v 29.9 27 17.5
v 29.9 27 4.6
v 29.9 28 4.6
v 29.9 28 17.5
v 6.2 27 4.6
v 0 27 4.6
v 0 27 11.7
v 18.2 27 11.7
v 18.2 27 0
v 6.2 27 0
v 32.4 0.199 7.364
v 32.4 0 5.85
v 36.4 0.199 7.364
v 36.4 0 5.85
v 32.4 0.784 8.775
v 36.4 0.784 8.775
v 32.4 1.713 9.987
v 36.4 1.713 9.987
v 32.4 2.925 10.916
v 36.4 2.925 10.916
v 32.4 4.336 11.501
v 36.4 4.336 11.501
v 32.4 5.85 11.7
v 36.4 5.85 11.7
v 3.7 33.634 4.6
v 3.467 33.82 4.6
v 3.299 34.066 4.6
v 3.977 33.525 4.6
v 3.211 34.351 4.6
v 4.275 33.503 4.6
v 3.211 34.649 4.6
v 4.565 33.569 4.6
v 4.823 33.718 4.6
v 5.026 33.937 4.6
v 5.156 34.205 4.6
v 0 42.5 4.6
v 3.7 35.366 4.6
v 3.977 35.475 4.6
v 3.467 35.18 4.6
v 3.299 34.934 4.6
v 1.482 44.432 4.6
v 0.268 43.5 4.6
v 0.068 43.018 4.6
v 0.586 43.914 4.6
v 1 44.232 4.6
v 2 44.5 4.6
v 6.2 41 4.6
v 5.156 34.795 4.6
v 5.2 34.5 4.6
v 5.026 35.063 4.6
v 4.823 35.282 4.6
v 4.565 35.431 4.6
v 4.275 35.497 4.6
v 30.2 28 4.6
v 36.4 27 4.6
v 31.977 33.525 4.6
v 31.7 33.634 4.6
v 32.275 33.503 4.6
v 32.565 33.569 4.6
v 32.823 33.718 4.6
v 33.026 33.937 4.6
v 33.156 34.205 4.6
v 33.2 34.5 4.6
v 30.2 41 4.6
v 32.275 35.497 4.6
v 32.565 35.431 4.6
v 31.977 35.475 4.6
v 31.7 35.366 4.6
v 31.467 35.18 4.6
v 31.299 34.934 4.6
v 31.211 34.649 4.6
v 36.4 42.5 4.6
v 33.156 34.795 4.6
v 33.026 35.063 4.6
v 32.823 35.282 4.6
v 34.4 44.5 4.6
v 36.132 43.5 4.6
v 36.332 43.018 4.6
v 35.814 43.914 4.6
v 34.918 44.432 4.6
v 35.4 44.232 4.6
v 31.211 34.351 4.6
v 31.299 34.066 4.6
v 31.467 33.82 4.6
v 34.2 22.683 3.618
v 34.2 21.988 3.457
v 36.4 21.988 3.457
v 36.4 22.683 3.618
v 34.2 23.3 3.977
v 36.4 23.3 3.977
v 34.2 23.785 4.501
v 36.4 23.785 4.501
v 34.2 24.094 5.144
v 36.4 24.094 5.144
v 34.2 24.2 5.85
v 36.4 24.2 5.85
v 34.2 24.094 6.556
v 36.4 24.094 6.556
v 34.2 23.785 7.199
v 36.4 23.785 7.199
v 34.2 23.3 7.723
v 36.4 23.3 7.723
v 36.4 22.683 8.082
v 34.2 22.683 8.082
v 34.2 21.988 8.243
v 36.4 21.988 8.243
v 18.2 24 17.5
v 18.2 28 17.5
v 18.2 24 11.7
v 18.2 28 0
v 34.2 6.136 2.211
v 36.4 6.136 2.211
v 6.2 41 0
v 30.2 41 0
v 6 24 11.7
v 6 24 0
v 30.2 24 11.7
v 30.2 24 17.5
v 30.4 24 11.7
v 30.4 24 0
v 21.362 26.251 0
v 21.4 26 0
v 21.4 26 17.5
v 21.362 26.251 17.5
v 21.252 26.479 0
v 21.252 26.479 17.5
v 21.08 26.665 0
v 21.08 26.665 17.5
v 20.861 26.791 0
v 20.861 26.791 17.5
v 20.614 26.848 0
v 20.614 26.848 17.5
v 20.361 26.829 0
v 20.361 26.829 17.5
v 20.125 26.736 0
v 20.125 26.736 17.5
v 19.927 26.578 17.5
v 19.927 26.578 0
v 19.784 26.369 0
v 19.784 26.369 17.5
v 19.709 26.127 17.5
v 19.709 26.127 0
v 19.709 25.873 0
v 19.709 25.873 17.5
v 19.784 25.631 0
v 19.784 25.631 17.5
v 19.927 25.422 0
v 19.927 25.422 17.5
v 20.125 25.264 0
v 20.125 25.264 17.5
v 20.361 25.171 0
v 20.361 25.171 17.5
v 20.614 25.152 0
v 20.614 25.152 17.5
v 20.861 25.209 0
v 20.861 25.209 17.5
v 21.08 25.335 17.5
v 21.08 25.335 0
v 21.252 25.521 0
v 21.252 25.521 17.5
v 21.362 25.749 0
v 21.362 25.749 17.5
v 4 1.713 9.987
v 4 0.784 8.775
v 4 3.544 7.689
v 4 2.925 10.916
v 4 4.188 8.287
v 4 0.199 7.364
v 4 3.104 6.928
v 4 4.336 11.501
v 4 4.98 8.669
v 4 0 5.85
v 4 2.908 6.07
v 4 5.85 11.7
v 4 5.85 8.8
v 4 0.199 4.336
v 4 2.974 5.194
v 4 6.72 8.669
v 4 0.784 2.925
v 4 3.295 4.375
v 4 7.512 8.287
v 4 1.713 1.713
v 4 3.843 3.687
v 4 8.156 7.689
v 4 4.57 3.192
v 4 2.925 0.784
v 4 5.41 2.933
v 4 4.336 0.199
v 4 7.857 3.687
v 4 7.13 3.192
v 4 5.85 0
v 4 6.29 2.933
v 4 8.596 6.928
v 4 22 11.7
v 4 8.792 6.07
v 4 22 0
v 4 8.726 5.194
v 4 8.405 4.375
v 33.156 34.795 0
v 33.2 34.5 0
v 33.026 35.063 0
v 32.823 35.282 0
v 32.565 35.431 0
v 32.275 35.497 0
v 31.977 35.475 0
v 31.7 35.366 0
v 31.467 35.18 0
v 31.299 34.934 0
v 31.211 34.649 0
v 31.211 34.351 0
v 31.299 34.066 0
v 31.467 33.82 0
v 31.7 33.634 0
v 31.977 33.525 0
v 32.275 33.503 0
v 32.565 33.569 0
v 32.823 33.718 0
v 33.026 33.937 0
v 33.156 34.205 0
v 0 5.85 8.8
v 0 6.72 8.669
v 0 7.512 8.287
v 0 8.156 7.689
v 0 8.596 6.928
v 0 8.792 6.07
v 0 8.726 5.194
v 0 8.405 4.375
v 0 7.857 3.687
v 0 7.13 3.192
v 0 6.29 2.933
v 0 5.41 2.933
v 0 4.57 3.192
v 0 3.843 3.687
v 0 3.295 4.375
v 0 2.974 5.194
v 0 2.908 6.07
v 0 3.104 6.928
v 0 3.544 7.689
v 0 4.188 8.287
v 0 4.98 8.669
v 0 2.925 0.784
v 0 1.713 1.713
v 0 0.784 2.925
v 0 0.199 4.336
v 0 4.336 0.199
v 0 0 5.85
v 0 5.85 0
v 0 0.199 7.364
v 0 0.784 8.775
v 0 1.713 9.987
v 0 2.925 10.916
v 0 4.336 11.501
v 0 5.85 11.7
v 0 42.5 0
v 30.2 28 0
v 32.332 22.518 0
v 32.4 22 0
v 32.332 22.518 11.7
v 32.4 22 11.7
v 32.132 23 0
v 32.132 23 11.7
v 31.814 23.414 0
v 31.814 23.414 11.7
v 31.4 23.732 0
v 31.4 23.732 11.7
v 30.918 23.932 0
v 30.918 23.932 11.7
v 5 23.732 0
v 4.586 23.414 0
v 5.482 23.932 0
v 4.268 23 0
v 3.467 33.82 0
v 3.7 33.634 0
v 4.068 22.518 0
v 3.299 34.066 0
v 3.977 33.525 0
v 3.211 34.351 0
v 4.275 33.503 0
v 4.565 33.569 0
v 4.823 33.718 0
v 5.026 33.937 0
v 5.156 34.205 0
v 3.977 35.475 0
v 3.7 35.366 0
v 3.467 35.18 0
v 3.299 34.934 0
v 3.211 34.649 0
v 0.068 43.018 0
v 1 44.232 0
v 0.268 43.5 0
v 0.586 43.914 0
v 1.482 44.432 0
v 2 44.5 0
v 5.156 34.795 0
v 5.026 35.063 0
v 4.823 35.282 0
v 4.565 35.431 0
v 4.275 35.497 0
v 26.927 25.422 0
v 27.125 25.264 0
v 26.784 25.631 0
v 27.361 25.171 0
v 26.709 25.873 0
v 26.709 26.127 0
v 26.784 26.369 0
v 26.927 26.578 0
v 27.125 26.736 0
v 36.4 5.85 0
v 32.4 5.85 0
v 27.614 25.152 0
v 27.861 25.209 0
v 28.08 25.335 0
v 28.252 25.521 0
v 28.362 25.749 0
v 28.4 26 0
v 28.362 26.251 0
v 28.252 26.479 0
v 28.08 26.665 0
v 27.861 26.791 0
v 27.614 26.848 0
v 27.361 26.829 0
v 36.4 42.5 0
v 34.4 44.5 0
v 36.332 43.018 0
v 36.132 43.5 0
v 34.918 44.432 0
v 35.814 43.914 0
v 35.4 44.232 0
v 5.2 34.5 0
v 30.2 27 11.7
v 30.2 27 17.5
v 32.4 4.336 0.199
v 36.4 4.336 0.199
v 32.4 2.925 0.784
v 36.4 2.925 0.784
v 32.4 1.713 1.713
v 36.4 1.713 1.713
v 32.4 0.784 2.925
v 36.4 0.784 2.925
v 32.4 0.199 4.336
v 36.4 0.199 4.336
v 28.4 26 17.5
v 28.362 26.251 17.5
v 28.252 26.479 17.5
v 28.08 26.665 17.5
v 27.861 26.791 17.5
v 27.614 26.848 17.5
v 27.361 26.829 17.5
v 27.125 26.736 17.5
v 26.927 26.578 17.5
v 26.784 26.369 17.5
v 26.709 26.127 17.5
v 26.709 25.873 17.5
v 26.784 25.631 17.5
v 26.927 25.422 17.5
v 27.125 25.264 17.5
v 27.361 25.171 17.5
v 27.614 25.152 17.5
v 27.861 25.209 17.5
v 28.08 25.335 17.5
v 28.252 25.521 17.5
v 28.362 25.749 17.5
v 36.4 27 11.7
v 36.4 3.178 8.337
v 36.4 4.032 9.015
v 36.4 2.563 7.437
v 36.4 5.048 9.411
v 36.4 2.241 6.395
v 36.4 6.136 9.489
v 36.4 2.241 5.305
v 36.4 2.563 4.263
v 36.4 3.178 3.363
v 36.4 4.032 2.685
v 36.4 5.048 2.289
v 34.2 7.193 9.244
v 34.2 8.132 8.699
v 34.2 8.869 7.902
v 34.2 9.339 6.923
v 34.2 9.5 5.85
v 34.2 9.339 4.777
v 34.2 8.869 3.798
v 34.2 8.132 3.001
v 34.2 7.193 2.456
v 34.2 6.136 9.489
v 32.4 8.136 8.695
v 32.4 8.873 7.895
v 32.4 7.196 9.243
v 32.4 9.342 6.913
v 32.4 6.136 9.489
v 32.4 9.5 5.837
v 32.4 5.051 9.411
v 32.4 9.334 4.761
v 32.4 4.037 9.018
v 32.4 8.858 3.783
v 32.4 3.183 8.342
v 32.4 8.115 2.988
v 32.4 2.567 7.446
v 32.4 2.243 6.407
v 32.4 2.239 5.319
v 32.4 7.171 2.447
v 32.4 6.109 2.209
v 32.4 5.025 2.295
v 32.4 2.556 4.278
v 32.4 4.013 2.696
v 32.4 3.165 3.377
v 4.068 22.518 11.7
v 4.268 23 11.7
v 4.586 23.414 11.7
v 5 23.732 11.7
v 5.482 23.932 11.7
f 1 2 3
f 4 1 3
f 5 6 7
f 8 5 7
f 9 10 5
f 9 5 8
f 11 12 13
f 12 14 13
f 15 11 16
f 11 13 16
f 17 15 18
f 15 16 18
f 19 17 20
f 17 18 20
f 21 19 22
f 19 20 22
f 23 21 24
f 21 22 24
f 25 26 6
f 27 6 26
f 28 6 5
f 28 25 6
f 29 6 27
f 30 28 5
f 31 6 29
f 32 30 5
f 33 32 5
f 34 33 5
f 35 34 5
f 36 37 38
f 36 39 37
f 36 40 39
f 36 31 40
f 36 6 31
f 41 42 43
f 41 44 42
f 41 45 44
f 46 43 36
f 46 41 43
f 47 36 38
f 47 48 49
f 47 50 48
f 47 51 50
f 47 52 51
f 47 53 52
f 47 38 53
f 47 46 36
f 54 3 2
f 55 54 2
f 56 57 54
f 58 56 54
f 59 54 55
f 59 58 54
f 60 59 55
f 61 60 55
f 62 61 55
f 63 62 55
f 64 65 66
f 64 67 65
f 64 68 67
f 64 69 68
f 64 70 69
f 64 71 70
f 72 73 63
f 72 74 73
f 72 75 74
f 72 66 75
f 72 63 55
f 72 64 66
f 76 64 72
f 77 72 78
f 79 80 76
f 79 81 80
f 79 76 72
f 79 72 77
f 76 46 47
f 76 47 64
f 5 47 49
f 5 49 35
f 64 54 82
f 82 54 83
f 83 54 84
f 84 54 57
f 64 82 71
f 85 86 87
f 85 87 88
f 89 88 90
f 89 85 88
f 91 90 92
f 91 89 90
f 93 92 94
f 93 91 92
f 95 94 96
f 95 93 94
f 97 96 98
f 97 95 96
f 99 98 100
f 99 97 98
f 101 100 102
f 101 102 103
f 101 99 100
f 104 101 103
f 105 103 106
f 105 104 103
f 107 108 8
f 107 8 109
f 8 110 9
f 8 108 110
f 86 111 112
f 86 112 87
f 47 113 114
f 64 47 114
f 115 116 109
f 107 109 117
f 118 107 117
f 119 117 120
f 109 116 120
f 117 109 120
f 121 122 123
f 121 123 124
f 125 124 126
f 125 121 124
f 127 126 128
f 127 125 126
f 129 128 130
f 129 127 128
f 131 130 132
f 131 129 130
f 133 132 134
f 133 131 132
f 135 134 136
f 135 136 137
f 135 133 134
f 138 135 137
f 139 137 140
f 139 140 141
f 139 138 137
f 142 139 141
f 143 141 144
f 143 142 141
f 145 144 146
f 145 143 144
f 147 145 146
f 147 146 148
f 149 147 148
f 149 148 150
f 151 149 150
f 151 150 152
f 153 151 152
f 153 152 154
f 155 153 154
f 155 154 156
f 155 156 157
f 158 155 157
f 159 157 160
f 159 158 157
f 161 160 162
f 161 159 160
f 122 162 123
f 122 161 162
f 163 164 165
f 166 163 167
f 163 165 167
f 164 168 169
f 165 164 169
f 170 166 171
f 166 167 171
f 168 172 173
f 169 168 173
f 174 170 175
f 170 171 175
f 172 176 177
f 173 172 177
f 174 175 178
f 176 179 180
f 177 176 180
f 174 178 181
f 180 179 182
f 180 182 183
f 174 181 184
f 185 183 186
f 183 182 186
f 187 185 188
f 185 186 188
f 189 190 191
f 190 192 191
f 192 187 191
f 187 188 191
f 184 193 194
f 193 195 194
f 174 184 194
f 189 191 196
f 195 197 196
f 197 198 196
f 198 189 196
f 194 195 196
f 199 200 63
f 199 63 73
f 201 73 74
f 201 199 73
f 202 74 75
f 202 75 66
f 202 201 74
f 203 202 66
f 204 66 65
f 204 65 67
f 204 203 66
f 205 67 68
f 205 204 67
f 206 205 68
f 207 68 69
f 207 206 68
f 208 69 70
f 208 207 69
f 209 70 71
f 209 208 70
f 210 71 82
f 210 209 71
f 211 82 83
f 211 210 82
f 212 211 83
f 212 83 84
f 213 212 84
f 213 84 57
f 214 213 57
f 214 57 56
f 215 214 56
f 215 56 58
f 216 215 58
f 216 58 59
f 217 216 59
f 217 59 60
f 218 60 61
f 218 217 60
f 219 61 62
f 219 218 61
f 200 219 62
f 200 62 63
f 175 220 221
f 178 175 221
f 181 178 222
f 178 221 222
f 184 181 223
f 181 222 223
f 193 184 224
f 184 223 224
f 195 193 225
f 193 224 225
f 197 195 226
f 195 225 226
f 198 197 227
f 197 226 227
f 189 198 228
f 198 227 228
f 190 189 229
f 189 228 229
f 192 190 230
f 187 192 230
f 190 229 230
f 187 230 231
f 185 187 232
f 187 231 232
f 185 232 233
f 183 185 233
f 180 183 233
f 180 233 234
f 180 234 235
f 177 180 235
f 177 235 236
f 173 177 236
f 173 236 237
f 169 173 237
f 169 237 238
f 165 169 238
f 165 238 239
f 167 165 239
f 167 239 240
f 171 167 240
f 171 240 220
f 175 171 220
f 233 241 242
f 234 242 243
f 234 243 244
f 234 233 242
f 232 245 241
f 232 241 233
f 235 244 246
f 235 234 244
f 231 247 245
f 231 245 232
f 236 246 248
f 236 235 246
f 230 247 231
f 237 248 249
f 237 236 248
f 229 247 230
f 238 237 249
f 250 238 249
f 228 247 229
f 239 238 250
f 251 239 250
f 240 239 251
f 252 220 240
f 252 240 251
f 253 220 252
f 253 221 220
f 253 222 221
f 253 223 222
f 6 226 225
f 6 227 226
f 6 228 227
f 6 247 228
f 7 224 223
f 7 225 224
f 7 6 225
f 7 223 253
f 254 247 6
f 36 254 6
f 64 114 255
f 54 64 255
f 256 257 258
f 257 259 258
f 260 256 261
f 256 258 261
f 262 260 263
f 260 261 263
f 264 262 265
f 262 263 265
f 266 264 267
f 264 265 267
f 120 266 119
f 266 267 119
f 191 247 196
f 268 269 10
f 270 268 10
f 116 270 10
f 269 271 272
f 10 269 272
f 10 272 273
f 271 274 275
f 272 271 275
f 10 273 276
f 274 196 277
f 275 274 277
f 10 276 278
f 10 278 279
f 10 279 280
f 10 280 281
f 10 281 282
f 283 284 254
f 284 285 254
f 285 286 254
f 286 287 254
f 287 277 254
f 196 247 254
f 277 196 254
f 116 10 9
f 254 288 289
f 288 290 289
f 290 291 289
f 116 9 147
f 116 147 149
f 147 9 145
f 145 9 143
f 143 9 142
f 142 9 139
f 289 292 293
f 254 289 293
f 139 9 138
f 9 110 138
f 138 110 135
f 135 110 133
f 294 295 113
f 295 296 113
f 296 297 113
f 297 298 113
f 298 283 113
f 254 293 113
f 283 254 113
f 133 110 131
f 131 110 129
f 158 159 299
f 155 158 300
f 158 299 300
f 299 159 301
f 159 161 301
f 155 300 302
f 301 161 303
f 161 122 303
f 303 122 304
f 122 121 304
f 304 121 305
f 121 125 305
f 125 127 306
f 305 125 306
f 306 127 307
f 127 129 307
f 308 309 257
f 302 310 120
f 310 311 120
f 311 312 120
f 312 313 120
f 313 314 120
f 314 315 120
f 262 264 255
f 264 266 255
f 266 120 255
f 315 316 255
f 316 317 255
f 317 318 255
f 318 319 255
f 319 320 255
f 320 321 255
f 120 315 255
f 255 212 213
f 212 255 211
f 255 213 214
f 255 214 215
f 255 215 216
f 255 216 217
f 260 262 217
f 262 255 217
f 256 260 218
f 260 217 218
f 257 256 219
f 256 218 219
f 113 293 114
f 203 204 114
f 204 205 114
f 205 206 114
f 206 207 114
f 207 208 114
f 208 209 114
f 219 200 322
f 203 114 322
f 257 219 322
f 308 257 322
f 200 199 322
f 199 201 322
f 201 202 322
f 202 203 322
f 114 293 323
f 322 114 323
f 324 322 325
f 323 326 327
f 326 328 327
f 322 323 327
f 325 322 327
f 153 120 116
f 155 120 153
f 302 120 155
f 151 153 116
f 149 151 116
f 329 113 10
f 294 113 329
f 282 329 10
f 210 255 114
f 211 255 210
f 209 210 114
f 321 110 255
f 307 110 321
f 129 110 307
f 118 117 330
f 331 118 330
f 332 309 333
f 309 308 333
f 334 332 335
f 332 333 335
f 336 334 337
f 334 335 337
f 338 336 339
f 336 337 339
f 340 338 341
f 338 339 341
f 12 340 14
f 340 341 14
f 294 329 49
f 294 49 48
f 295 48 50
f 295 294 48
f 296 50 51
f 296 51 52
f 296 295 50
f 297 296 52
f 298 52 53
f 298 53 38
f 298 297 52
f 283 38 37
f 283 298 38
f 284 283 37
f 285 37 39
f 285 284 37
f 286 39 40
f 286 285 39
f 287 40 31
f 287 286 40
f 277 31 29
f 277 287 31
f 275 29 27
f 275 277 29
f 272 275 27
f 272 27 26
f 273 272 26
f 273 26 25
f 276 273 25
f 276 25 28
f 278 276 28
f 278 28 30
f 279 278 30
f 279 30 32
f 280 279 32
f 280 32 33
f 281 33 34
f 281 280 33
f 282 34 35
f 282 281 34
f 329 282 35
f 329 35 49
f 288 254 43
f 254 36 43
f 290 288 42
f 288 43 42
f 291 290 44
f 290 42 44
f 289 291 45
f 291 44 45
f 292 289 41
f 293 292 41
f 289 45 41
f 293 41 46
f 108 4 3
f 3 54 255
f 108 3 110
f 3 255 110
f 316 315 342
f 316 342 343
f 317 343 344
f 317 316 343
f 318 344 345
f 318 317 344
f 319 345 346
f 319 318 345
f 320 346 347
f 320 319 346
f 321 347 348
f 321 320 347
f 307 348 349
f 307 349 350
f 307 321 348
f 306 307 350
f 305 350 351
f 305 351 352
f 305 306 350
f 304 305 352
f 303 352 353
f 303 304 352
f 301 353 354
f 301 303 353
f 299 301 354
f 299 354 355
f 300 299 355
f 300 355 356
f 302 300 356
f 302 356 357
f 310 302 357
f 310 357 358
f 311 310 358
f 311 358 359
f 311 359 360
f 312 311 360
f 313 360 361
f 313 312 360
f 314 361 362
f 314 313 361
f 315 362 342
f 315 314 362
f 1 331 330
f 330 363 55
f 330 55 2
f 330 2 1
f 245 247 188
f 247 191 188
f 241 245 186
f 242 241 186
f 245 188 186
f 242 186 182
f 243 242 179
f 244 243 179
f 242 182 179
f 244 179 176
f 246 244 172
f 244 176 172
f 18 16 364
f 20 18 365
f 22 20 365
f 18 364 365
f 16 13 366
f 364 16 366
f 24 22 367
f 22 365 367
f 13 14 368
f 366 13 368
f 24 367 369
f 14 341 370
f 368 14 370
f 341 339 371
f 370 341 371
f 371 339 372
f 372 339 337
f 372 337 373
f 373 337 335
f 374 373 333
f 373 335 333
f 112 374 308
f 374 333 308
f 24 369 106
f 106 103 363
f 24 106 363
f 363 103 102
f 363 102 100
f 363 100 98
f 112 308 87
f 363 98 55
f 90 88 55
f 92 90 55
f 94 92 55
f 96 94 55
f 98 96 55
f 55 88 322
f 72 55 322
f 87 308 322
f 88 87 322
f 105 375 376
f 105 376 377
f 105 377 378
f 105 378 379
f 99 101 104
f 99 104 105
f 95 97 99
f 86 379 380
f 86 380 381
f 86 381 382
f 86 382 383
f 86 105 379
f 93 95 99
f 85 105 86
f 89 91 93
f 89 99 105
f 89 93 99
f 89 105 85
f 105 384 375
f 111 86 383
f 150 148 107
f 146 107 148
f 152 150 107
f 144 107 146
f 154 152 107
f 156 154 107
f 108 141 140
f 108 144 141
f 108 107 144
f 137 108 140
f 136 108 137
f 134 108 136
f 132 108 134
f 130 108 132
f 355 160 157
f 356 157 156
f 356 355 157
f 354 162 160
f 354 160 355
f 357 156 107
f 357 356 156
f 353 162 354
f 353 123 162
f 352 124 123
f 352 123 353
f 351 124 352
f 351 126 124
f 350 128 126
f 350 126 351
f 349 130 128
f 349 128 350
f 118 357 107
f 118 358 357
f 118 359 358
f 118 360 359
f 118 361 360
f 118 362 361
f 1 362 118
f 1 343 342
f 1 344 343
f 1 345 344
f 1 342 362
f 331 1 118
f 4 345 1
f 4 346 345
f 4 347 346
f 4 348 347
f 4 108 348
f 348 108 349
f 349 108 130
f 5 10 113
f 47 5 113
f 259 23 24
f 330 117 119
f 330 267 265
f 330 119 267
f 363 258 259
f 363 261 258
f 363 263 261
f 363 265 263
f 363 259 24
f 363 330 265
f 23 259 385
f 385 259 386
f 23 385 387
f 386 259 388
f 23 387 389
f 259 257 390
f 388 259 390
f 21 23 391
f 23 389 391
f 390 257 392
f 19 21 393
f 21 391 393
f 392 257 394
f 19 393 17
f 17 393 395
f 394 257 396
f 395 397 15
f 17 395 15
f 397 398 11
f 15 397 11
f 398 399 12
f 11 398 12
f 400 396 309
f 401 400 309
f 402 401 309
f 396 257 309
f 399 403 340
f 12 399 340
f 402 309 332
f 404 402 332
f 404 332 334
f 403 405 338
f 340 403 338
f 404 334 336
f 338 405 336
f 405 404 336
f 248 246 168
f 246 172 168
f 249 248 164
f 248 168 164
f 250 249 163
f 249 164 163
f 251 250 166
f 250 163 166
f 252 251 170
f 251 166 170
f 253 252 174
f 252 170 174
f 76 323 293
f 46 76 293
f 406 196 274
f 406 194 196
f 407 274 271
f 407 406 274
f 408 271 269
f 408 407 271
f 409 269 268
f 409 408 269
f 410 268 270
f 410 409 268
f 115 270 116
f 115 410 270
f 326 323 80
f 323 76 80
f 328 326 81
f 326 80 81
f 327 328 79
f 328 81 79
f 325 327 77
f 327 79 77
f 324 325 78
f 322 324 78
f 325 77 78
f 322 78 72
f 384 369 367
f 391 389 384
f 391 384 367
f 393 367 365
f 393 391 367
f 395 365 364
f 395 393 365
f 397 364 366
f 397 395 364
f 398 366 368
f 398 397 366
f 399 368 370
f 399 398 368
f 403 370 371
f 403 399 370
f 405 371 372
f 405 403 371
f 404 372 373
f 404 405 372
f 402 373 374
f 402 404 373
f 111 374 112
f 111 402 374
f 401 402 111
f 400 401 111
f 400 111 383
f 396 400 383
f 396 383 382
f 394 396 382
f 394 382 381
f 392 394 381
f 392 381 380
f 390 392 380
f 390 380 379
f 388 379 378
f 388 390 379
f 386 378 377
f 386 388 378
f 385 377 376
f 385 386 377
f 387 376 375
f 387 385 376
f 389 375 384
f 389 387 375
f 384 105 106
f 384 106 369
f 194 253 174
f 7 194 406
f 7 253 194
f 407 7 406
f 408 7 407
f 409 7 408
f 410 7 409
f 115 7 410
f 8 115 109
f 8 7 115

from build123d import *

# Parameters (mm, degrees)
SKETCH_1_R          = 1
EXTRUDE_1_DEPTH     = 4.6
EXTRUDE_2_DEPTH     = 11.7
SKETCH_1_4_W        = 12
SKETCH_1_4_H        = 3
EXTRUDE_3_DEPTH     = 11.7
SKETCH_2_R          = 3.65
CUT_EXTRUDE_1_DEPTH = 24.5
CUT_EXTRUDE_2_DEPTH = 2.2
FILLET_2_R          = 5.85
FILLET_3_R          = 5.85
FILLET_4_R          = 5.85
FILLET_1_R          = 5.85
FILLET_5_R          = 2
FILLET_6_R          = 2
FILLET_8_R          = 2
SKETCH_3_R          = 2.95
CUT_EXTRUDE_3_DEPTH = 10
SKETCH_1_6_R        = 0.85
EXTRUDE_5_DEPTH     = 17.5
FILLET_9_R          = 2
CUT_EXTRUDE_START   = -2.2
CUT_EXTRUDE_4_DEPTH = 2.2
CUT_EXTRUDE_START_2 = -10.2
SKETCH_4_3_R        = 3.65
SKETCH_4_3_R_2      = 2.95
CUT_EXTRUDE_5_DEPTH = 10.2
EXTRUDE_6_DEPTH     = 2.2
SKETCH_2_5_R        = 3.65
EXTRUDE_7_DEPTH     = 4
SKETCH_5_R          = 2.95
CUT_EXTRUDE_6_DEPTH = 8.2


with BuildPart() as part:
    # 草图1 → 凸台-拉伸1 (new body)
    with BuildSketch(Plane.XY):
        Polygon((0, 44.5), (0, 27), (6.2, 27), (6.2, 28), (6.2, 41), (30.2, 41), (30.2, 28), (29.9, 28), (29.9, 27), (30.2, 27), (35, 27), (36.4, 27), (36.4, 44.5), align=None)
        with Locations((4.2, 34.5)):
            Circle(SKETCH_1_R, mode=Mode.SUBTRACT)
        with Locations((32.2, 34.5)):
            Circle(SKETCH_1_R, mode=Mode.SUBTRACT)
    extrude(amount=EXTRUDE_1_DEPTH)

    # 草图1<3> → 凸台-拉伸2 (add)
    with BuildSketch(Plane.XY):
        Polygon((0, 27), (0, 0), (4, 0), (4, 24), (6.2, 24), (6.2, 27), align=None)
        Polygon((36.4, 0), (36.4, 27), (30.2, 27), (30.2, 24), (32.4, 24), (32.4, 0), align=None)
    extrude(amount=EXTRUDE_2_DEPTH)

    # 草图1<4> → 凸台-拉伸3 (add)
    with BuildSketch(Plane.XY):
        with Locations((12.2, 25.5)):
            Rectangle(SKETCH_1_4_W, SKETCH_1_4_H)
    extrude(amount=EXTRUDE_3_DEPTH)

    # 草图2 → 切除-拉伸1 (cut)
    with BuildSketch(Plane.ZY):
        with Locations((5.85, 5.85)):
            Circle(SKETCH_2_R)
    extrude(amount=-CUT_EXTRUDE_1_DEPTH, mode=Mode.SUBTRACT)

    # 草图2<3> → 切除-拉伸2 (cut)
    with BuildSketch(Plane.ZY):
        with BuildLine():
            Line((9.488773874, 6.136050157), (8.242618438, 21.988087774))
            ThreePointArc((8.242618438, 21.988087774), (5.85, 24.2), (3.457381562, 21.988087774))
            Line((3.457381562, 21.988087774), (2.211226126, 6.136050157))
            ThreePointArc((2.211226126, 6.136050157), (5.85, 9.5), (9.488773874, 6.136050157))
        make_face()
    extrude(amount=-CUT_EXTRUDE_2_DEPTH, mode=Mode.SUBTRACT)

    # 圆角2
    fillet_2_edges = [part.edges().sort_by_distance(p)[0] for p in [
        (2, 0, 0),
    ]]
    fillet(fillet_2_edges, radius=FILLET_2_R)

    # 圆角3
    fillet_3_edges = [part.edges().sort_by_distance(p)[0] for p in [
        (34.4, 0, 0),
    ]]
    fillet(fillet_3_edges, radius=FILLET_3_R)

    # 圆角4
    fillet_4_edges = [part.edges().sort_by_distance(p)[0] for p in [
        (34.4, 0, 11.7),
    ]]
    fillet(fillet_4_edges, radius=FILLET_4_R - 0.0001)  # a hair under: the kernel refuses the full size

    # 圆角1
    fillet_1_edges = [part.edges().sort_by_distance(p)[0] for p in [
        (2, 0, 11.7),
    ]]
    fillet(fillet_1_edges, radius=FILLET_1_R - 0.0001)  # a hair under: the kernel refuses the full size

    # 圆角5
    fillet_5_edges = [part.edges().sort_by_distance(p)[0] for p in [
        (0, 44.5, 2.3),
    ]]
    fillet(fillet_5_edges, radius=FILLET_5_R)

    # 圆角6
    fillet_6_edges = [part.edges().sort_by_distance(p)[0] for p in [
        (36.4, 44.5, 2.3),
    ]]
    fillet(fillet_6_edges, radius=FILLET_6_R)

    # 圆角8
    fillet_8_edges = [part.edges().sort_by_distance(p)[0] for p in [
        (4, 24, 5.85),
    ]]
    fillet(fillet_8_edges, radius=FILLET_8_R)

    # 草图3 → 切除-拉伸3 (cut)
    with BuildSketch(Plane(origin=(36.4, 0, 0), x_dir=(0, 0, -1), z_dir=(1, 0, 0))):
        with Locations(Location((-5.85, 5.85, 0), (0, 0, 90))):
            Circle(SKETCH_3_R)
    extrude(amount=-CUT_EXTRUDE_3_DEPTH, mode=Mode.SUBTRACT)

    # 草图1<6> → 凸台-拉伸5 (add)
    with BuildSketch(Plane.XY):
        Polygon((18.2, 28), (18.2, 27), (18.2, 24), (30.2, 24), (30.2, 27), (29.9, 27), (29.9, 28), align=None)
        with Locations((20.55, 26)):
            Circle(SKETCH_1_6_R, mode=Mode.SUBTRACT)
        with Locations((27.55, 26)):
            Circle(SKETCH_1_6_R, mode=Mode.SUBTRACT)
    extrude(amount=EXTRUDE_5_DEPTH)

    # 圆角9
    fillet_9_edges = [part.edges().sort_by_distance(p)[0] for p in [
        (32.4, 24, 5.85),
    ]]
    fillet(fillet_9_edges, radius=FILLET_9_R)

    # 草图4 → 切除-拉伸4 (cut)
    with BuildSketch(Plane(origin=(36.4, 0, 0), x_dir=(0, 0, -1), z_dir=(1, 0, 0)).offset(CUT_EXTRUDE_START)):
        with BuildLine():
            ThreePointArc((-3.457381562, 21.988087774), (-5.85, 24.2), (-8.242618438, 21.988087774))
            Line((-8.242618438, 21.988087774), (-9.488773874, 6.136050157))
            ThreePointArc((-9.488773874, 6.136050157), (-5.85, 9.5), (-2.211226126, 6.136050157))
            Line((-2.211226126, 6.136050157), (-3.457381562, 21.988087774))
        make_face()
    extrude(amount=CUT_EXTRUDE_4_DEPTH, mode=Mode.SUBTRACT)

    # 草图4<3> → 切除-拉伸5 (cut)
    with BuildSketch(Plane(origin=(36.4, 0, 0), x_dir=(0, 0, -1), z_dir=(1, 0, 0)).offset(CUT_EXTRUDE_START_2)):
        with Locations(Location((-5.85, 5.85, 0), (0, 0, 175.505125981))):
            Circle(SKETCH_4_3_R)
        with Locations((-5.85, 5.85)):
            Circle(SKETCH_4_3_R_2, mode=Mode.SUBTRACT)
    extrude(amount=CUT_EXTRUDE_5_DEPTH, mode=Mode.SUBTRACT)

    # 草图2<4> → 凸台-拉伸6 (add)
    with BuildSketch(Plane.ZY):
        with BuildLine():
            Line((9.488773874, 6.136050157), (8.242618438, 21.988087774))
            ThreePointArc((8.242618438, 21.988087774), (5.85, 24.2), (3.457381562, 21.988087774))
            Line((3.457381562, 21.988087774), (2.211226126, 6.136050157))
            ThreePointArc((2.211226126, 6.136050157), (5.85, 9.5), (9.488773874, 6.136050157))
        make_face()
    extrude(amount=-EXTRUDE_6_DEPTH)

    # 草图2<5> → 凸台-拉伸7 (add)
    with BuildSketch(Plane.ZY):
        with Locations(Location((5.85, 5.85, 0), (0, 0, 4.494874019))):
            Circle(SKETCH_2_5_R)
    extrude(amount=-EXTRUDE_7_DEPTH)

    # 草图5 → 切除-拉伸6 (cut)
    with BuildSketch(Plane.ZY):
        with Locations((5.85, 5.85)):
            Circle(SKETCH_5_R)
    extrude(amount=-CUT_EXTRUDE_6_DEPTH, mode=Mode.SUBTRACT)


solid = part.part
